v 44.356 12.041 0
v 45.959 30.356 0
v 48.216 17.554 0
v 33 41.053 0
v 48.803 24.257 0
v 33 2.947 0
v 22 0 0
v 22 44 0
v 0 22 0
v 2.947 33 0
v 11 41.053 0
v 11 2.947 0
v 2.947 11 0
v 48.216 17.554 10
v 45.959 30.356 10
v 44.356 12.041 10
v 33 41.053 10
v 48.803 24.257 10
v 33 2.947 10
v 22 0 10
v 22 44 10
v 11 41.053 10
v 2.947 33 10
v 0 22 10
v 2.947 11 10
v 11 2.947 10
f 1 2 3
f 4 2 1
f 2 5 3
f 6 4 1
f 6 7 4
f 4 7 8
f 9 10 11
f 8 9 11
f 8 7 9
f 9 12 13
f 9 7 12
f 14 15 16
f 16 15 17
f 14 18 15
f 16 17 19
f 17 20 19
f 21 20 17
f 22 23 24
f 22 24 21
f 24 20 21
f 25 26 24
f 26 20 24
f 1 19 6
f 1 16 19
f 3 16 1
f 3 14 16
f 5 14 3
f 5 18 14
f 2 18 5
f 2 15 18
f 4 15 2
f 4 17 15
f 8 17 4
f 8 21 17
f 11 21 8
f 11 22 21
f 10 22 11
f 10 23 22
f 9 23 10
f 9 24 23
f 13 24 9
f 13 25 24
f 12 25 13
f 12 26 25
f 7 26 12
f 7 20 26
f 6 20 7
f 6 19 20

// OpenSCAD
$fn = 32;

// ----------------------------------------------------------------------
// Eccentric disc: step, 10 mm thick
// ----------------------------------------------------------------------

// --- parameters (mm) ---
profile_height = 10;      // extrusion height
profile_points = 13;      // points of the closed outline

profile = [[0, 22], [2.947, 11], [11, 2.947], [22, 0], [33, 2.947], [44.356, 12.041], [48.216, 17.554], [48.803, 24.257], [45.959, 30.356], [33, 41.053], [22, 44], [11, 41.053], [2.947, 33]];  // single closed polygon, 13 points, counter clockwise

// --- the one profile operation ---
linear_extrude(height = profile_height) polygon(points = profile);
